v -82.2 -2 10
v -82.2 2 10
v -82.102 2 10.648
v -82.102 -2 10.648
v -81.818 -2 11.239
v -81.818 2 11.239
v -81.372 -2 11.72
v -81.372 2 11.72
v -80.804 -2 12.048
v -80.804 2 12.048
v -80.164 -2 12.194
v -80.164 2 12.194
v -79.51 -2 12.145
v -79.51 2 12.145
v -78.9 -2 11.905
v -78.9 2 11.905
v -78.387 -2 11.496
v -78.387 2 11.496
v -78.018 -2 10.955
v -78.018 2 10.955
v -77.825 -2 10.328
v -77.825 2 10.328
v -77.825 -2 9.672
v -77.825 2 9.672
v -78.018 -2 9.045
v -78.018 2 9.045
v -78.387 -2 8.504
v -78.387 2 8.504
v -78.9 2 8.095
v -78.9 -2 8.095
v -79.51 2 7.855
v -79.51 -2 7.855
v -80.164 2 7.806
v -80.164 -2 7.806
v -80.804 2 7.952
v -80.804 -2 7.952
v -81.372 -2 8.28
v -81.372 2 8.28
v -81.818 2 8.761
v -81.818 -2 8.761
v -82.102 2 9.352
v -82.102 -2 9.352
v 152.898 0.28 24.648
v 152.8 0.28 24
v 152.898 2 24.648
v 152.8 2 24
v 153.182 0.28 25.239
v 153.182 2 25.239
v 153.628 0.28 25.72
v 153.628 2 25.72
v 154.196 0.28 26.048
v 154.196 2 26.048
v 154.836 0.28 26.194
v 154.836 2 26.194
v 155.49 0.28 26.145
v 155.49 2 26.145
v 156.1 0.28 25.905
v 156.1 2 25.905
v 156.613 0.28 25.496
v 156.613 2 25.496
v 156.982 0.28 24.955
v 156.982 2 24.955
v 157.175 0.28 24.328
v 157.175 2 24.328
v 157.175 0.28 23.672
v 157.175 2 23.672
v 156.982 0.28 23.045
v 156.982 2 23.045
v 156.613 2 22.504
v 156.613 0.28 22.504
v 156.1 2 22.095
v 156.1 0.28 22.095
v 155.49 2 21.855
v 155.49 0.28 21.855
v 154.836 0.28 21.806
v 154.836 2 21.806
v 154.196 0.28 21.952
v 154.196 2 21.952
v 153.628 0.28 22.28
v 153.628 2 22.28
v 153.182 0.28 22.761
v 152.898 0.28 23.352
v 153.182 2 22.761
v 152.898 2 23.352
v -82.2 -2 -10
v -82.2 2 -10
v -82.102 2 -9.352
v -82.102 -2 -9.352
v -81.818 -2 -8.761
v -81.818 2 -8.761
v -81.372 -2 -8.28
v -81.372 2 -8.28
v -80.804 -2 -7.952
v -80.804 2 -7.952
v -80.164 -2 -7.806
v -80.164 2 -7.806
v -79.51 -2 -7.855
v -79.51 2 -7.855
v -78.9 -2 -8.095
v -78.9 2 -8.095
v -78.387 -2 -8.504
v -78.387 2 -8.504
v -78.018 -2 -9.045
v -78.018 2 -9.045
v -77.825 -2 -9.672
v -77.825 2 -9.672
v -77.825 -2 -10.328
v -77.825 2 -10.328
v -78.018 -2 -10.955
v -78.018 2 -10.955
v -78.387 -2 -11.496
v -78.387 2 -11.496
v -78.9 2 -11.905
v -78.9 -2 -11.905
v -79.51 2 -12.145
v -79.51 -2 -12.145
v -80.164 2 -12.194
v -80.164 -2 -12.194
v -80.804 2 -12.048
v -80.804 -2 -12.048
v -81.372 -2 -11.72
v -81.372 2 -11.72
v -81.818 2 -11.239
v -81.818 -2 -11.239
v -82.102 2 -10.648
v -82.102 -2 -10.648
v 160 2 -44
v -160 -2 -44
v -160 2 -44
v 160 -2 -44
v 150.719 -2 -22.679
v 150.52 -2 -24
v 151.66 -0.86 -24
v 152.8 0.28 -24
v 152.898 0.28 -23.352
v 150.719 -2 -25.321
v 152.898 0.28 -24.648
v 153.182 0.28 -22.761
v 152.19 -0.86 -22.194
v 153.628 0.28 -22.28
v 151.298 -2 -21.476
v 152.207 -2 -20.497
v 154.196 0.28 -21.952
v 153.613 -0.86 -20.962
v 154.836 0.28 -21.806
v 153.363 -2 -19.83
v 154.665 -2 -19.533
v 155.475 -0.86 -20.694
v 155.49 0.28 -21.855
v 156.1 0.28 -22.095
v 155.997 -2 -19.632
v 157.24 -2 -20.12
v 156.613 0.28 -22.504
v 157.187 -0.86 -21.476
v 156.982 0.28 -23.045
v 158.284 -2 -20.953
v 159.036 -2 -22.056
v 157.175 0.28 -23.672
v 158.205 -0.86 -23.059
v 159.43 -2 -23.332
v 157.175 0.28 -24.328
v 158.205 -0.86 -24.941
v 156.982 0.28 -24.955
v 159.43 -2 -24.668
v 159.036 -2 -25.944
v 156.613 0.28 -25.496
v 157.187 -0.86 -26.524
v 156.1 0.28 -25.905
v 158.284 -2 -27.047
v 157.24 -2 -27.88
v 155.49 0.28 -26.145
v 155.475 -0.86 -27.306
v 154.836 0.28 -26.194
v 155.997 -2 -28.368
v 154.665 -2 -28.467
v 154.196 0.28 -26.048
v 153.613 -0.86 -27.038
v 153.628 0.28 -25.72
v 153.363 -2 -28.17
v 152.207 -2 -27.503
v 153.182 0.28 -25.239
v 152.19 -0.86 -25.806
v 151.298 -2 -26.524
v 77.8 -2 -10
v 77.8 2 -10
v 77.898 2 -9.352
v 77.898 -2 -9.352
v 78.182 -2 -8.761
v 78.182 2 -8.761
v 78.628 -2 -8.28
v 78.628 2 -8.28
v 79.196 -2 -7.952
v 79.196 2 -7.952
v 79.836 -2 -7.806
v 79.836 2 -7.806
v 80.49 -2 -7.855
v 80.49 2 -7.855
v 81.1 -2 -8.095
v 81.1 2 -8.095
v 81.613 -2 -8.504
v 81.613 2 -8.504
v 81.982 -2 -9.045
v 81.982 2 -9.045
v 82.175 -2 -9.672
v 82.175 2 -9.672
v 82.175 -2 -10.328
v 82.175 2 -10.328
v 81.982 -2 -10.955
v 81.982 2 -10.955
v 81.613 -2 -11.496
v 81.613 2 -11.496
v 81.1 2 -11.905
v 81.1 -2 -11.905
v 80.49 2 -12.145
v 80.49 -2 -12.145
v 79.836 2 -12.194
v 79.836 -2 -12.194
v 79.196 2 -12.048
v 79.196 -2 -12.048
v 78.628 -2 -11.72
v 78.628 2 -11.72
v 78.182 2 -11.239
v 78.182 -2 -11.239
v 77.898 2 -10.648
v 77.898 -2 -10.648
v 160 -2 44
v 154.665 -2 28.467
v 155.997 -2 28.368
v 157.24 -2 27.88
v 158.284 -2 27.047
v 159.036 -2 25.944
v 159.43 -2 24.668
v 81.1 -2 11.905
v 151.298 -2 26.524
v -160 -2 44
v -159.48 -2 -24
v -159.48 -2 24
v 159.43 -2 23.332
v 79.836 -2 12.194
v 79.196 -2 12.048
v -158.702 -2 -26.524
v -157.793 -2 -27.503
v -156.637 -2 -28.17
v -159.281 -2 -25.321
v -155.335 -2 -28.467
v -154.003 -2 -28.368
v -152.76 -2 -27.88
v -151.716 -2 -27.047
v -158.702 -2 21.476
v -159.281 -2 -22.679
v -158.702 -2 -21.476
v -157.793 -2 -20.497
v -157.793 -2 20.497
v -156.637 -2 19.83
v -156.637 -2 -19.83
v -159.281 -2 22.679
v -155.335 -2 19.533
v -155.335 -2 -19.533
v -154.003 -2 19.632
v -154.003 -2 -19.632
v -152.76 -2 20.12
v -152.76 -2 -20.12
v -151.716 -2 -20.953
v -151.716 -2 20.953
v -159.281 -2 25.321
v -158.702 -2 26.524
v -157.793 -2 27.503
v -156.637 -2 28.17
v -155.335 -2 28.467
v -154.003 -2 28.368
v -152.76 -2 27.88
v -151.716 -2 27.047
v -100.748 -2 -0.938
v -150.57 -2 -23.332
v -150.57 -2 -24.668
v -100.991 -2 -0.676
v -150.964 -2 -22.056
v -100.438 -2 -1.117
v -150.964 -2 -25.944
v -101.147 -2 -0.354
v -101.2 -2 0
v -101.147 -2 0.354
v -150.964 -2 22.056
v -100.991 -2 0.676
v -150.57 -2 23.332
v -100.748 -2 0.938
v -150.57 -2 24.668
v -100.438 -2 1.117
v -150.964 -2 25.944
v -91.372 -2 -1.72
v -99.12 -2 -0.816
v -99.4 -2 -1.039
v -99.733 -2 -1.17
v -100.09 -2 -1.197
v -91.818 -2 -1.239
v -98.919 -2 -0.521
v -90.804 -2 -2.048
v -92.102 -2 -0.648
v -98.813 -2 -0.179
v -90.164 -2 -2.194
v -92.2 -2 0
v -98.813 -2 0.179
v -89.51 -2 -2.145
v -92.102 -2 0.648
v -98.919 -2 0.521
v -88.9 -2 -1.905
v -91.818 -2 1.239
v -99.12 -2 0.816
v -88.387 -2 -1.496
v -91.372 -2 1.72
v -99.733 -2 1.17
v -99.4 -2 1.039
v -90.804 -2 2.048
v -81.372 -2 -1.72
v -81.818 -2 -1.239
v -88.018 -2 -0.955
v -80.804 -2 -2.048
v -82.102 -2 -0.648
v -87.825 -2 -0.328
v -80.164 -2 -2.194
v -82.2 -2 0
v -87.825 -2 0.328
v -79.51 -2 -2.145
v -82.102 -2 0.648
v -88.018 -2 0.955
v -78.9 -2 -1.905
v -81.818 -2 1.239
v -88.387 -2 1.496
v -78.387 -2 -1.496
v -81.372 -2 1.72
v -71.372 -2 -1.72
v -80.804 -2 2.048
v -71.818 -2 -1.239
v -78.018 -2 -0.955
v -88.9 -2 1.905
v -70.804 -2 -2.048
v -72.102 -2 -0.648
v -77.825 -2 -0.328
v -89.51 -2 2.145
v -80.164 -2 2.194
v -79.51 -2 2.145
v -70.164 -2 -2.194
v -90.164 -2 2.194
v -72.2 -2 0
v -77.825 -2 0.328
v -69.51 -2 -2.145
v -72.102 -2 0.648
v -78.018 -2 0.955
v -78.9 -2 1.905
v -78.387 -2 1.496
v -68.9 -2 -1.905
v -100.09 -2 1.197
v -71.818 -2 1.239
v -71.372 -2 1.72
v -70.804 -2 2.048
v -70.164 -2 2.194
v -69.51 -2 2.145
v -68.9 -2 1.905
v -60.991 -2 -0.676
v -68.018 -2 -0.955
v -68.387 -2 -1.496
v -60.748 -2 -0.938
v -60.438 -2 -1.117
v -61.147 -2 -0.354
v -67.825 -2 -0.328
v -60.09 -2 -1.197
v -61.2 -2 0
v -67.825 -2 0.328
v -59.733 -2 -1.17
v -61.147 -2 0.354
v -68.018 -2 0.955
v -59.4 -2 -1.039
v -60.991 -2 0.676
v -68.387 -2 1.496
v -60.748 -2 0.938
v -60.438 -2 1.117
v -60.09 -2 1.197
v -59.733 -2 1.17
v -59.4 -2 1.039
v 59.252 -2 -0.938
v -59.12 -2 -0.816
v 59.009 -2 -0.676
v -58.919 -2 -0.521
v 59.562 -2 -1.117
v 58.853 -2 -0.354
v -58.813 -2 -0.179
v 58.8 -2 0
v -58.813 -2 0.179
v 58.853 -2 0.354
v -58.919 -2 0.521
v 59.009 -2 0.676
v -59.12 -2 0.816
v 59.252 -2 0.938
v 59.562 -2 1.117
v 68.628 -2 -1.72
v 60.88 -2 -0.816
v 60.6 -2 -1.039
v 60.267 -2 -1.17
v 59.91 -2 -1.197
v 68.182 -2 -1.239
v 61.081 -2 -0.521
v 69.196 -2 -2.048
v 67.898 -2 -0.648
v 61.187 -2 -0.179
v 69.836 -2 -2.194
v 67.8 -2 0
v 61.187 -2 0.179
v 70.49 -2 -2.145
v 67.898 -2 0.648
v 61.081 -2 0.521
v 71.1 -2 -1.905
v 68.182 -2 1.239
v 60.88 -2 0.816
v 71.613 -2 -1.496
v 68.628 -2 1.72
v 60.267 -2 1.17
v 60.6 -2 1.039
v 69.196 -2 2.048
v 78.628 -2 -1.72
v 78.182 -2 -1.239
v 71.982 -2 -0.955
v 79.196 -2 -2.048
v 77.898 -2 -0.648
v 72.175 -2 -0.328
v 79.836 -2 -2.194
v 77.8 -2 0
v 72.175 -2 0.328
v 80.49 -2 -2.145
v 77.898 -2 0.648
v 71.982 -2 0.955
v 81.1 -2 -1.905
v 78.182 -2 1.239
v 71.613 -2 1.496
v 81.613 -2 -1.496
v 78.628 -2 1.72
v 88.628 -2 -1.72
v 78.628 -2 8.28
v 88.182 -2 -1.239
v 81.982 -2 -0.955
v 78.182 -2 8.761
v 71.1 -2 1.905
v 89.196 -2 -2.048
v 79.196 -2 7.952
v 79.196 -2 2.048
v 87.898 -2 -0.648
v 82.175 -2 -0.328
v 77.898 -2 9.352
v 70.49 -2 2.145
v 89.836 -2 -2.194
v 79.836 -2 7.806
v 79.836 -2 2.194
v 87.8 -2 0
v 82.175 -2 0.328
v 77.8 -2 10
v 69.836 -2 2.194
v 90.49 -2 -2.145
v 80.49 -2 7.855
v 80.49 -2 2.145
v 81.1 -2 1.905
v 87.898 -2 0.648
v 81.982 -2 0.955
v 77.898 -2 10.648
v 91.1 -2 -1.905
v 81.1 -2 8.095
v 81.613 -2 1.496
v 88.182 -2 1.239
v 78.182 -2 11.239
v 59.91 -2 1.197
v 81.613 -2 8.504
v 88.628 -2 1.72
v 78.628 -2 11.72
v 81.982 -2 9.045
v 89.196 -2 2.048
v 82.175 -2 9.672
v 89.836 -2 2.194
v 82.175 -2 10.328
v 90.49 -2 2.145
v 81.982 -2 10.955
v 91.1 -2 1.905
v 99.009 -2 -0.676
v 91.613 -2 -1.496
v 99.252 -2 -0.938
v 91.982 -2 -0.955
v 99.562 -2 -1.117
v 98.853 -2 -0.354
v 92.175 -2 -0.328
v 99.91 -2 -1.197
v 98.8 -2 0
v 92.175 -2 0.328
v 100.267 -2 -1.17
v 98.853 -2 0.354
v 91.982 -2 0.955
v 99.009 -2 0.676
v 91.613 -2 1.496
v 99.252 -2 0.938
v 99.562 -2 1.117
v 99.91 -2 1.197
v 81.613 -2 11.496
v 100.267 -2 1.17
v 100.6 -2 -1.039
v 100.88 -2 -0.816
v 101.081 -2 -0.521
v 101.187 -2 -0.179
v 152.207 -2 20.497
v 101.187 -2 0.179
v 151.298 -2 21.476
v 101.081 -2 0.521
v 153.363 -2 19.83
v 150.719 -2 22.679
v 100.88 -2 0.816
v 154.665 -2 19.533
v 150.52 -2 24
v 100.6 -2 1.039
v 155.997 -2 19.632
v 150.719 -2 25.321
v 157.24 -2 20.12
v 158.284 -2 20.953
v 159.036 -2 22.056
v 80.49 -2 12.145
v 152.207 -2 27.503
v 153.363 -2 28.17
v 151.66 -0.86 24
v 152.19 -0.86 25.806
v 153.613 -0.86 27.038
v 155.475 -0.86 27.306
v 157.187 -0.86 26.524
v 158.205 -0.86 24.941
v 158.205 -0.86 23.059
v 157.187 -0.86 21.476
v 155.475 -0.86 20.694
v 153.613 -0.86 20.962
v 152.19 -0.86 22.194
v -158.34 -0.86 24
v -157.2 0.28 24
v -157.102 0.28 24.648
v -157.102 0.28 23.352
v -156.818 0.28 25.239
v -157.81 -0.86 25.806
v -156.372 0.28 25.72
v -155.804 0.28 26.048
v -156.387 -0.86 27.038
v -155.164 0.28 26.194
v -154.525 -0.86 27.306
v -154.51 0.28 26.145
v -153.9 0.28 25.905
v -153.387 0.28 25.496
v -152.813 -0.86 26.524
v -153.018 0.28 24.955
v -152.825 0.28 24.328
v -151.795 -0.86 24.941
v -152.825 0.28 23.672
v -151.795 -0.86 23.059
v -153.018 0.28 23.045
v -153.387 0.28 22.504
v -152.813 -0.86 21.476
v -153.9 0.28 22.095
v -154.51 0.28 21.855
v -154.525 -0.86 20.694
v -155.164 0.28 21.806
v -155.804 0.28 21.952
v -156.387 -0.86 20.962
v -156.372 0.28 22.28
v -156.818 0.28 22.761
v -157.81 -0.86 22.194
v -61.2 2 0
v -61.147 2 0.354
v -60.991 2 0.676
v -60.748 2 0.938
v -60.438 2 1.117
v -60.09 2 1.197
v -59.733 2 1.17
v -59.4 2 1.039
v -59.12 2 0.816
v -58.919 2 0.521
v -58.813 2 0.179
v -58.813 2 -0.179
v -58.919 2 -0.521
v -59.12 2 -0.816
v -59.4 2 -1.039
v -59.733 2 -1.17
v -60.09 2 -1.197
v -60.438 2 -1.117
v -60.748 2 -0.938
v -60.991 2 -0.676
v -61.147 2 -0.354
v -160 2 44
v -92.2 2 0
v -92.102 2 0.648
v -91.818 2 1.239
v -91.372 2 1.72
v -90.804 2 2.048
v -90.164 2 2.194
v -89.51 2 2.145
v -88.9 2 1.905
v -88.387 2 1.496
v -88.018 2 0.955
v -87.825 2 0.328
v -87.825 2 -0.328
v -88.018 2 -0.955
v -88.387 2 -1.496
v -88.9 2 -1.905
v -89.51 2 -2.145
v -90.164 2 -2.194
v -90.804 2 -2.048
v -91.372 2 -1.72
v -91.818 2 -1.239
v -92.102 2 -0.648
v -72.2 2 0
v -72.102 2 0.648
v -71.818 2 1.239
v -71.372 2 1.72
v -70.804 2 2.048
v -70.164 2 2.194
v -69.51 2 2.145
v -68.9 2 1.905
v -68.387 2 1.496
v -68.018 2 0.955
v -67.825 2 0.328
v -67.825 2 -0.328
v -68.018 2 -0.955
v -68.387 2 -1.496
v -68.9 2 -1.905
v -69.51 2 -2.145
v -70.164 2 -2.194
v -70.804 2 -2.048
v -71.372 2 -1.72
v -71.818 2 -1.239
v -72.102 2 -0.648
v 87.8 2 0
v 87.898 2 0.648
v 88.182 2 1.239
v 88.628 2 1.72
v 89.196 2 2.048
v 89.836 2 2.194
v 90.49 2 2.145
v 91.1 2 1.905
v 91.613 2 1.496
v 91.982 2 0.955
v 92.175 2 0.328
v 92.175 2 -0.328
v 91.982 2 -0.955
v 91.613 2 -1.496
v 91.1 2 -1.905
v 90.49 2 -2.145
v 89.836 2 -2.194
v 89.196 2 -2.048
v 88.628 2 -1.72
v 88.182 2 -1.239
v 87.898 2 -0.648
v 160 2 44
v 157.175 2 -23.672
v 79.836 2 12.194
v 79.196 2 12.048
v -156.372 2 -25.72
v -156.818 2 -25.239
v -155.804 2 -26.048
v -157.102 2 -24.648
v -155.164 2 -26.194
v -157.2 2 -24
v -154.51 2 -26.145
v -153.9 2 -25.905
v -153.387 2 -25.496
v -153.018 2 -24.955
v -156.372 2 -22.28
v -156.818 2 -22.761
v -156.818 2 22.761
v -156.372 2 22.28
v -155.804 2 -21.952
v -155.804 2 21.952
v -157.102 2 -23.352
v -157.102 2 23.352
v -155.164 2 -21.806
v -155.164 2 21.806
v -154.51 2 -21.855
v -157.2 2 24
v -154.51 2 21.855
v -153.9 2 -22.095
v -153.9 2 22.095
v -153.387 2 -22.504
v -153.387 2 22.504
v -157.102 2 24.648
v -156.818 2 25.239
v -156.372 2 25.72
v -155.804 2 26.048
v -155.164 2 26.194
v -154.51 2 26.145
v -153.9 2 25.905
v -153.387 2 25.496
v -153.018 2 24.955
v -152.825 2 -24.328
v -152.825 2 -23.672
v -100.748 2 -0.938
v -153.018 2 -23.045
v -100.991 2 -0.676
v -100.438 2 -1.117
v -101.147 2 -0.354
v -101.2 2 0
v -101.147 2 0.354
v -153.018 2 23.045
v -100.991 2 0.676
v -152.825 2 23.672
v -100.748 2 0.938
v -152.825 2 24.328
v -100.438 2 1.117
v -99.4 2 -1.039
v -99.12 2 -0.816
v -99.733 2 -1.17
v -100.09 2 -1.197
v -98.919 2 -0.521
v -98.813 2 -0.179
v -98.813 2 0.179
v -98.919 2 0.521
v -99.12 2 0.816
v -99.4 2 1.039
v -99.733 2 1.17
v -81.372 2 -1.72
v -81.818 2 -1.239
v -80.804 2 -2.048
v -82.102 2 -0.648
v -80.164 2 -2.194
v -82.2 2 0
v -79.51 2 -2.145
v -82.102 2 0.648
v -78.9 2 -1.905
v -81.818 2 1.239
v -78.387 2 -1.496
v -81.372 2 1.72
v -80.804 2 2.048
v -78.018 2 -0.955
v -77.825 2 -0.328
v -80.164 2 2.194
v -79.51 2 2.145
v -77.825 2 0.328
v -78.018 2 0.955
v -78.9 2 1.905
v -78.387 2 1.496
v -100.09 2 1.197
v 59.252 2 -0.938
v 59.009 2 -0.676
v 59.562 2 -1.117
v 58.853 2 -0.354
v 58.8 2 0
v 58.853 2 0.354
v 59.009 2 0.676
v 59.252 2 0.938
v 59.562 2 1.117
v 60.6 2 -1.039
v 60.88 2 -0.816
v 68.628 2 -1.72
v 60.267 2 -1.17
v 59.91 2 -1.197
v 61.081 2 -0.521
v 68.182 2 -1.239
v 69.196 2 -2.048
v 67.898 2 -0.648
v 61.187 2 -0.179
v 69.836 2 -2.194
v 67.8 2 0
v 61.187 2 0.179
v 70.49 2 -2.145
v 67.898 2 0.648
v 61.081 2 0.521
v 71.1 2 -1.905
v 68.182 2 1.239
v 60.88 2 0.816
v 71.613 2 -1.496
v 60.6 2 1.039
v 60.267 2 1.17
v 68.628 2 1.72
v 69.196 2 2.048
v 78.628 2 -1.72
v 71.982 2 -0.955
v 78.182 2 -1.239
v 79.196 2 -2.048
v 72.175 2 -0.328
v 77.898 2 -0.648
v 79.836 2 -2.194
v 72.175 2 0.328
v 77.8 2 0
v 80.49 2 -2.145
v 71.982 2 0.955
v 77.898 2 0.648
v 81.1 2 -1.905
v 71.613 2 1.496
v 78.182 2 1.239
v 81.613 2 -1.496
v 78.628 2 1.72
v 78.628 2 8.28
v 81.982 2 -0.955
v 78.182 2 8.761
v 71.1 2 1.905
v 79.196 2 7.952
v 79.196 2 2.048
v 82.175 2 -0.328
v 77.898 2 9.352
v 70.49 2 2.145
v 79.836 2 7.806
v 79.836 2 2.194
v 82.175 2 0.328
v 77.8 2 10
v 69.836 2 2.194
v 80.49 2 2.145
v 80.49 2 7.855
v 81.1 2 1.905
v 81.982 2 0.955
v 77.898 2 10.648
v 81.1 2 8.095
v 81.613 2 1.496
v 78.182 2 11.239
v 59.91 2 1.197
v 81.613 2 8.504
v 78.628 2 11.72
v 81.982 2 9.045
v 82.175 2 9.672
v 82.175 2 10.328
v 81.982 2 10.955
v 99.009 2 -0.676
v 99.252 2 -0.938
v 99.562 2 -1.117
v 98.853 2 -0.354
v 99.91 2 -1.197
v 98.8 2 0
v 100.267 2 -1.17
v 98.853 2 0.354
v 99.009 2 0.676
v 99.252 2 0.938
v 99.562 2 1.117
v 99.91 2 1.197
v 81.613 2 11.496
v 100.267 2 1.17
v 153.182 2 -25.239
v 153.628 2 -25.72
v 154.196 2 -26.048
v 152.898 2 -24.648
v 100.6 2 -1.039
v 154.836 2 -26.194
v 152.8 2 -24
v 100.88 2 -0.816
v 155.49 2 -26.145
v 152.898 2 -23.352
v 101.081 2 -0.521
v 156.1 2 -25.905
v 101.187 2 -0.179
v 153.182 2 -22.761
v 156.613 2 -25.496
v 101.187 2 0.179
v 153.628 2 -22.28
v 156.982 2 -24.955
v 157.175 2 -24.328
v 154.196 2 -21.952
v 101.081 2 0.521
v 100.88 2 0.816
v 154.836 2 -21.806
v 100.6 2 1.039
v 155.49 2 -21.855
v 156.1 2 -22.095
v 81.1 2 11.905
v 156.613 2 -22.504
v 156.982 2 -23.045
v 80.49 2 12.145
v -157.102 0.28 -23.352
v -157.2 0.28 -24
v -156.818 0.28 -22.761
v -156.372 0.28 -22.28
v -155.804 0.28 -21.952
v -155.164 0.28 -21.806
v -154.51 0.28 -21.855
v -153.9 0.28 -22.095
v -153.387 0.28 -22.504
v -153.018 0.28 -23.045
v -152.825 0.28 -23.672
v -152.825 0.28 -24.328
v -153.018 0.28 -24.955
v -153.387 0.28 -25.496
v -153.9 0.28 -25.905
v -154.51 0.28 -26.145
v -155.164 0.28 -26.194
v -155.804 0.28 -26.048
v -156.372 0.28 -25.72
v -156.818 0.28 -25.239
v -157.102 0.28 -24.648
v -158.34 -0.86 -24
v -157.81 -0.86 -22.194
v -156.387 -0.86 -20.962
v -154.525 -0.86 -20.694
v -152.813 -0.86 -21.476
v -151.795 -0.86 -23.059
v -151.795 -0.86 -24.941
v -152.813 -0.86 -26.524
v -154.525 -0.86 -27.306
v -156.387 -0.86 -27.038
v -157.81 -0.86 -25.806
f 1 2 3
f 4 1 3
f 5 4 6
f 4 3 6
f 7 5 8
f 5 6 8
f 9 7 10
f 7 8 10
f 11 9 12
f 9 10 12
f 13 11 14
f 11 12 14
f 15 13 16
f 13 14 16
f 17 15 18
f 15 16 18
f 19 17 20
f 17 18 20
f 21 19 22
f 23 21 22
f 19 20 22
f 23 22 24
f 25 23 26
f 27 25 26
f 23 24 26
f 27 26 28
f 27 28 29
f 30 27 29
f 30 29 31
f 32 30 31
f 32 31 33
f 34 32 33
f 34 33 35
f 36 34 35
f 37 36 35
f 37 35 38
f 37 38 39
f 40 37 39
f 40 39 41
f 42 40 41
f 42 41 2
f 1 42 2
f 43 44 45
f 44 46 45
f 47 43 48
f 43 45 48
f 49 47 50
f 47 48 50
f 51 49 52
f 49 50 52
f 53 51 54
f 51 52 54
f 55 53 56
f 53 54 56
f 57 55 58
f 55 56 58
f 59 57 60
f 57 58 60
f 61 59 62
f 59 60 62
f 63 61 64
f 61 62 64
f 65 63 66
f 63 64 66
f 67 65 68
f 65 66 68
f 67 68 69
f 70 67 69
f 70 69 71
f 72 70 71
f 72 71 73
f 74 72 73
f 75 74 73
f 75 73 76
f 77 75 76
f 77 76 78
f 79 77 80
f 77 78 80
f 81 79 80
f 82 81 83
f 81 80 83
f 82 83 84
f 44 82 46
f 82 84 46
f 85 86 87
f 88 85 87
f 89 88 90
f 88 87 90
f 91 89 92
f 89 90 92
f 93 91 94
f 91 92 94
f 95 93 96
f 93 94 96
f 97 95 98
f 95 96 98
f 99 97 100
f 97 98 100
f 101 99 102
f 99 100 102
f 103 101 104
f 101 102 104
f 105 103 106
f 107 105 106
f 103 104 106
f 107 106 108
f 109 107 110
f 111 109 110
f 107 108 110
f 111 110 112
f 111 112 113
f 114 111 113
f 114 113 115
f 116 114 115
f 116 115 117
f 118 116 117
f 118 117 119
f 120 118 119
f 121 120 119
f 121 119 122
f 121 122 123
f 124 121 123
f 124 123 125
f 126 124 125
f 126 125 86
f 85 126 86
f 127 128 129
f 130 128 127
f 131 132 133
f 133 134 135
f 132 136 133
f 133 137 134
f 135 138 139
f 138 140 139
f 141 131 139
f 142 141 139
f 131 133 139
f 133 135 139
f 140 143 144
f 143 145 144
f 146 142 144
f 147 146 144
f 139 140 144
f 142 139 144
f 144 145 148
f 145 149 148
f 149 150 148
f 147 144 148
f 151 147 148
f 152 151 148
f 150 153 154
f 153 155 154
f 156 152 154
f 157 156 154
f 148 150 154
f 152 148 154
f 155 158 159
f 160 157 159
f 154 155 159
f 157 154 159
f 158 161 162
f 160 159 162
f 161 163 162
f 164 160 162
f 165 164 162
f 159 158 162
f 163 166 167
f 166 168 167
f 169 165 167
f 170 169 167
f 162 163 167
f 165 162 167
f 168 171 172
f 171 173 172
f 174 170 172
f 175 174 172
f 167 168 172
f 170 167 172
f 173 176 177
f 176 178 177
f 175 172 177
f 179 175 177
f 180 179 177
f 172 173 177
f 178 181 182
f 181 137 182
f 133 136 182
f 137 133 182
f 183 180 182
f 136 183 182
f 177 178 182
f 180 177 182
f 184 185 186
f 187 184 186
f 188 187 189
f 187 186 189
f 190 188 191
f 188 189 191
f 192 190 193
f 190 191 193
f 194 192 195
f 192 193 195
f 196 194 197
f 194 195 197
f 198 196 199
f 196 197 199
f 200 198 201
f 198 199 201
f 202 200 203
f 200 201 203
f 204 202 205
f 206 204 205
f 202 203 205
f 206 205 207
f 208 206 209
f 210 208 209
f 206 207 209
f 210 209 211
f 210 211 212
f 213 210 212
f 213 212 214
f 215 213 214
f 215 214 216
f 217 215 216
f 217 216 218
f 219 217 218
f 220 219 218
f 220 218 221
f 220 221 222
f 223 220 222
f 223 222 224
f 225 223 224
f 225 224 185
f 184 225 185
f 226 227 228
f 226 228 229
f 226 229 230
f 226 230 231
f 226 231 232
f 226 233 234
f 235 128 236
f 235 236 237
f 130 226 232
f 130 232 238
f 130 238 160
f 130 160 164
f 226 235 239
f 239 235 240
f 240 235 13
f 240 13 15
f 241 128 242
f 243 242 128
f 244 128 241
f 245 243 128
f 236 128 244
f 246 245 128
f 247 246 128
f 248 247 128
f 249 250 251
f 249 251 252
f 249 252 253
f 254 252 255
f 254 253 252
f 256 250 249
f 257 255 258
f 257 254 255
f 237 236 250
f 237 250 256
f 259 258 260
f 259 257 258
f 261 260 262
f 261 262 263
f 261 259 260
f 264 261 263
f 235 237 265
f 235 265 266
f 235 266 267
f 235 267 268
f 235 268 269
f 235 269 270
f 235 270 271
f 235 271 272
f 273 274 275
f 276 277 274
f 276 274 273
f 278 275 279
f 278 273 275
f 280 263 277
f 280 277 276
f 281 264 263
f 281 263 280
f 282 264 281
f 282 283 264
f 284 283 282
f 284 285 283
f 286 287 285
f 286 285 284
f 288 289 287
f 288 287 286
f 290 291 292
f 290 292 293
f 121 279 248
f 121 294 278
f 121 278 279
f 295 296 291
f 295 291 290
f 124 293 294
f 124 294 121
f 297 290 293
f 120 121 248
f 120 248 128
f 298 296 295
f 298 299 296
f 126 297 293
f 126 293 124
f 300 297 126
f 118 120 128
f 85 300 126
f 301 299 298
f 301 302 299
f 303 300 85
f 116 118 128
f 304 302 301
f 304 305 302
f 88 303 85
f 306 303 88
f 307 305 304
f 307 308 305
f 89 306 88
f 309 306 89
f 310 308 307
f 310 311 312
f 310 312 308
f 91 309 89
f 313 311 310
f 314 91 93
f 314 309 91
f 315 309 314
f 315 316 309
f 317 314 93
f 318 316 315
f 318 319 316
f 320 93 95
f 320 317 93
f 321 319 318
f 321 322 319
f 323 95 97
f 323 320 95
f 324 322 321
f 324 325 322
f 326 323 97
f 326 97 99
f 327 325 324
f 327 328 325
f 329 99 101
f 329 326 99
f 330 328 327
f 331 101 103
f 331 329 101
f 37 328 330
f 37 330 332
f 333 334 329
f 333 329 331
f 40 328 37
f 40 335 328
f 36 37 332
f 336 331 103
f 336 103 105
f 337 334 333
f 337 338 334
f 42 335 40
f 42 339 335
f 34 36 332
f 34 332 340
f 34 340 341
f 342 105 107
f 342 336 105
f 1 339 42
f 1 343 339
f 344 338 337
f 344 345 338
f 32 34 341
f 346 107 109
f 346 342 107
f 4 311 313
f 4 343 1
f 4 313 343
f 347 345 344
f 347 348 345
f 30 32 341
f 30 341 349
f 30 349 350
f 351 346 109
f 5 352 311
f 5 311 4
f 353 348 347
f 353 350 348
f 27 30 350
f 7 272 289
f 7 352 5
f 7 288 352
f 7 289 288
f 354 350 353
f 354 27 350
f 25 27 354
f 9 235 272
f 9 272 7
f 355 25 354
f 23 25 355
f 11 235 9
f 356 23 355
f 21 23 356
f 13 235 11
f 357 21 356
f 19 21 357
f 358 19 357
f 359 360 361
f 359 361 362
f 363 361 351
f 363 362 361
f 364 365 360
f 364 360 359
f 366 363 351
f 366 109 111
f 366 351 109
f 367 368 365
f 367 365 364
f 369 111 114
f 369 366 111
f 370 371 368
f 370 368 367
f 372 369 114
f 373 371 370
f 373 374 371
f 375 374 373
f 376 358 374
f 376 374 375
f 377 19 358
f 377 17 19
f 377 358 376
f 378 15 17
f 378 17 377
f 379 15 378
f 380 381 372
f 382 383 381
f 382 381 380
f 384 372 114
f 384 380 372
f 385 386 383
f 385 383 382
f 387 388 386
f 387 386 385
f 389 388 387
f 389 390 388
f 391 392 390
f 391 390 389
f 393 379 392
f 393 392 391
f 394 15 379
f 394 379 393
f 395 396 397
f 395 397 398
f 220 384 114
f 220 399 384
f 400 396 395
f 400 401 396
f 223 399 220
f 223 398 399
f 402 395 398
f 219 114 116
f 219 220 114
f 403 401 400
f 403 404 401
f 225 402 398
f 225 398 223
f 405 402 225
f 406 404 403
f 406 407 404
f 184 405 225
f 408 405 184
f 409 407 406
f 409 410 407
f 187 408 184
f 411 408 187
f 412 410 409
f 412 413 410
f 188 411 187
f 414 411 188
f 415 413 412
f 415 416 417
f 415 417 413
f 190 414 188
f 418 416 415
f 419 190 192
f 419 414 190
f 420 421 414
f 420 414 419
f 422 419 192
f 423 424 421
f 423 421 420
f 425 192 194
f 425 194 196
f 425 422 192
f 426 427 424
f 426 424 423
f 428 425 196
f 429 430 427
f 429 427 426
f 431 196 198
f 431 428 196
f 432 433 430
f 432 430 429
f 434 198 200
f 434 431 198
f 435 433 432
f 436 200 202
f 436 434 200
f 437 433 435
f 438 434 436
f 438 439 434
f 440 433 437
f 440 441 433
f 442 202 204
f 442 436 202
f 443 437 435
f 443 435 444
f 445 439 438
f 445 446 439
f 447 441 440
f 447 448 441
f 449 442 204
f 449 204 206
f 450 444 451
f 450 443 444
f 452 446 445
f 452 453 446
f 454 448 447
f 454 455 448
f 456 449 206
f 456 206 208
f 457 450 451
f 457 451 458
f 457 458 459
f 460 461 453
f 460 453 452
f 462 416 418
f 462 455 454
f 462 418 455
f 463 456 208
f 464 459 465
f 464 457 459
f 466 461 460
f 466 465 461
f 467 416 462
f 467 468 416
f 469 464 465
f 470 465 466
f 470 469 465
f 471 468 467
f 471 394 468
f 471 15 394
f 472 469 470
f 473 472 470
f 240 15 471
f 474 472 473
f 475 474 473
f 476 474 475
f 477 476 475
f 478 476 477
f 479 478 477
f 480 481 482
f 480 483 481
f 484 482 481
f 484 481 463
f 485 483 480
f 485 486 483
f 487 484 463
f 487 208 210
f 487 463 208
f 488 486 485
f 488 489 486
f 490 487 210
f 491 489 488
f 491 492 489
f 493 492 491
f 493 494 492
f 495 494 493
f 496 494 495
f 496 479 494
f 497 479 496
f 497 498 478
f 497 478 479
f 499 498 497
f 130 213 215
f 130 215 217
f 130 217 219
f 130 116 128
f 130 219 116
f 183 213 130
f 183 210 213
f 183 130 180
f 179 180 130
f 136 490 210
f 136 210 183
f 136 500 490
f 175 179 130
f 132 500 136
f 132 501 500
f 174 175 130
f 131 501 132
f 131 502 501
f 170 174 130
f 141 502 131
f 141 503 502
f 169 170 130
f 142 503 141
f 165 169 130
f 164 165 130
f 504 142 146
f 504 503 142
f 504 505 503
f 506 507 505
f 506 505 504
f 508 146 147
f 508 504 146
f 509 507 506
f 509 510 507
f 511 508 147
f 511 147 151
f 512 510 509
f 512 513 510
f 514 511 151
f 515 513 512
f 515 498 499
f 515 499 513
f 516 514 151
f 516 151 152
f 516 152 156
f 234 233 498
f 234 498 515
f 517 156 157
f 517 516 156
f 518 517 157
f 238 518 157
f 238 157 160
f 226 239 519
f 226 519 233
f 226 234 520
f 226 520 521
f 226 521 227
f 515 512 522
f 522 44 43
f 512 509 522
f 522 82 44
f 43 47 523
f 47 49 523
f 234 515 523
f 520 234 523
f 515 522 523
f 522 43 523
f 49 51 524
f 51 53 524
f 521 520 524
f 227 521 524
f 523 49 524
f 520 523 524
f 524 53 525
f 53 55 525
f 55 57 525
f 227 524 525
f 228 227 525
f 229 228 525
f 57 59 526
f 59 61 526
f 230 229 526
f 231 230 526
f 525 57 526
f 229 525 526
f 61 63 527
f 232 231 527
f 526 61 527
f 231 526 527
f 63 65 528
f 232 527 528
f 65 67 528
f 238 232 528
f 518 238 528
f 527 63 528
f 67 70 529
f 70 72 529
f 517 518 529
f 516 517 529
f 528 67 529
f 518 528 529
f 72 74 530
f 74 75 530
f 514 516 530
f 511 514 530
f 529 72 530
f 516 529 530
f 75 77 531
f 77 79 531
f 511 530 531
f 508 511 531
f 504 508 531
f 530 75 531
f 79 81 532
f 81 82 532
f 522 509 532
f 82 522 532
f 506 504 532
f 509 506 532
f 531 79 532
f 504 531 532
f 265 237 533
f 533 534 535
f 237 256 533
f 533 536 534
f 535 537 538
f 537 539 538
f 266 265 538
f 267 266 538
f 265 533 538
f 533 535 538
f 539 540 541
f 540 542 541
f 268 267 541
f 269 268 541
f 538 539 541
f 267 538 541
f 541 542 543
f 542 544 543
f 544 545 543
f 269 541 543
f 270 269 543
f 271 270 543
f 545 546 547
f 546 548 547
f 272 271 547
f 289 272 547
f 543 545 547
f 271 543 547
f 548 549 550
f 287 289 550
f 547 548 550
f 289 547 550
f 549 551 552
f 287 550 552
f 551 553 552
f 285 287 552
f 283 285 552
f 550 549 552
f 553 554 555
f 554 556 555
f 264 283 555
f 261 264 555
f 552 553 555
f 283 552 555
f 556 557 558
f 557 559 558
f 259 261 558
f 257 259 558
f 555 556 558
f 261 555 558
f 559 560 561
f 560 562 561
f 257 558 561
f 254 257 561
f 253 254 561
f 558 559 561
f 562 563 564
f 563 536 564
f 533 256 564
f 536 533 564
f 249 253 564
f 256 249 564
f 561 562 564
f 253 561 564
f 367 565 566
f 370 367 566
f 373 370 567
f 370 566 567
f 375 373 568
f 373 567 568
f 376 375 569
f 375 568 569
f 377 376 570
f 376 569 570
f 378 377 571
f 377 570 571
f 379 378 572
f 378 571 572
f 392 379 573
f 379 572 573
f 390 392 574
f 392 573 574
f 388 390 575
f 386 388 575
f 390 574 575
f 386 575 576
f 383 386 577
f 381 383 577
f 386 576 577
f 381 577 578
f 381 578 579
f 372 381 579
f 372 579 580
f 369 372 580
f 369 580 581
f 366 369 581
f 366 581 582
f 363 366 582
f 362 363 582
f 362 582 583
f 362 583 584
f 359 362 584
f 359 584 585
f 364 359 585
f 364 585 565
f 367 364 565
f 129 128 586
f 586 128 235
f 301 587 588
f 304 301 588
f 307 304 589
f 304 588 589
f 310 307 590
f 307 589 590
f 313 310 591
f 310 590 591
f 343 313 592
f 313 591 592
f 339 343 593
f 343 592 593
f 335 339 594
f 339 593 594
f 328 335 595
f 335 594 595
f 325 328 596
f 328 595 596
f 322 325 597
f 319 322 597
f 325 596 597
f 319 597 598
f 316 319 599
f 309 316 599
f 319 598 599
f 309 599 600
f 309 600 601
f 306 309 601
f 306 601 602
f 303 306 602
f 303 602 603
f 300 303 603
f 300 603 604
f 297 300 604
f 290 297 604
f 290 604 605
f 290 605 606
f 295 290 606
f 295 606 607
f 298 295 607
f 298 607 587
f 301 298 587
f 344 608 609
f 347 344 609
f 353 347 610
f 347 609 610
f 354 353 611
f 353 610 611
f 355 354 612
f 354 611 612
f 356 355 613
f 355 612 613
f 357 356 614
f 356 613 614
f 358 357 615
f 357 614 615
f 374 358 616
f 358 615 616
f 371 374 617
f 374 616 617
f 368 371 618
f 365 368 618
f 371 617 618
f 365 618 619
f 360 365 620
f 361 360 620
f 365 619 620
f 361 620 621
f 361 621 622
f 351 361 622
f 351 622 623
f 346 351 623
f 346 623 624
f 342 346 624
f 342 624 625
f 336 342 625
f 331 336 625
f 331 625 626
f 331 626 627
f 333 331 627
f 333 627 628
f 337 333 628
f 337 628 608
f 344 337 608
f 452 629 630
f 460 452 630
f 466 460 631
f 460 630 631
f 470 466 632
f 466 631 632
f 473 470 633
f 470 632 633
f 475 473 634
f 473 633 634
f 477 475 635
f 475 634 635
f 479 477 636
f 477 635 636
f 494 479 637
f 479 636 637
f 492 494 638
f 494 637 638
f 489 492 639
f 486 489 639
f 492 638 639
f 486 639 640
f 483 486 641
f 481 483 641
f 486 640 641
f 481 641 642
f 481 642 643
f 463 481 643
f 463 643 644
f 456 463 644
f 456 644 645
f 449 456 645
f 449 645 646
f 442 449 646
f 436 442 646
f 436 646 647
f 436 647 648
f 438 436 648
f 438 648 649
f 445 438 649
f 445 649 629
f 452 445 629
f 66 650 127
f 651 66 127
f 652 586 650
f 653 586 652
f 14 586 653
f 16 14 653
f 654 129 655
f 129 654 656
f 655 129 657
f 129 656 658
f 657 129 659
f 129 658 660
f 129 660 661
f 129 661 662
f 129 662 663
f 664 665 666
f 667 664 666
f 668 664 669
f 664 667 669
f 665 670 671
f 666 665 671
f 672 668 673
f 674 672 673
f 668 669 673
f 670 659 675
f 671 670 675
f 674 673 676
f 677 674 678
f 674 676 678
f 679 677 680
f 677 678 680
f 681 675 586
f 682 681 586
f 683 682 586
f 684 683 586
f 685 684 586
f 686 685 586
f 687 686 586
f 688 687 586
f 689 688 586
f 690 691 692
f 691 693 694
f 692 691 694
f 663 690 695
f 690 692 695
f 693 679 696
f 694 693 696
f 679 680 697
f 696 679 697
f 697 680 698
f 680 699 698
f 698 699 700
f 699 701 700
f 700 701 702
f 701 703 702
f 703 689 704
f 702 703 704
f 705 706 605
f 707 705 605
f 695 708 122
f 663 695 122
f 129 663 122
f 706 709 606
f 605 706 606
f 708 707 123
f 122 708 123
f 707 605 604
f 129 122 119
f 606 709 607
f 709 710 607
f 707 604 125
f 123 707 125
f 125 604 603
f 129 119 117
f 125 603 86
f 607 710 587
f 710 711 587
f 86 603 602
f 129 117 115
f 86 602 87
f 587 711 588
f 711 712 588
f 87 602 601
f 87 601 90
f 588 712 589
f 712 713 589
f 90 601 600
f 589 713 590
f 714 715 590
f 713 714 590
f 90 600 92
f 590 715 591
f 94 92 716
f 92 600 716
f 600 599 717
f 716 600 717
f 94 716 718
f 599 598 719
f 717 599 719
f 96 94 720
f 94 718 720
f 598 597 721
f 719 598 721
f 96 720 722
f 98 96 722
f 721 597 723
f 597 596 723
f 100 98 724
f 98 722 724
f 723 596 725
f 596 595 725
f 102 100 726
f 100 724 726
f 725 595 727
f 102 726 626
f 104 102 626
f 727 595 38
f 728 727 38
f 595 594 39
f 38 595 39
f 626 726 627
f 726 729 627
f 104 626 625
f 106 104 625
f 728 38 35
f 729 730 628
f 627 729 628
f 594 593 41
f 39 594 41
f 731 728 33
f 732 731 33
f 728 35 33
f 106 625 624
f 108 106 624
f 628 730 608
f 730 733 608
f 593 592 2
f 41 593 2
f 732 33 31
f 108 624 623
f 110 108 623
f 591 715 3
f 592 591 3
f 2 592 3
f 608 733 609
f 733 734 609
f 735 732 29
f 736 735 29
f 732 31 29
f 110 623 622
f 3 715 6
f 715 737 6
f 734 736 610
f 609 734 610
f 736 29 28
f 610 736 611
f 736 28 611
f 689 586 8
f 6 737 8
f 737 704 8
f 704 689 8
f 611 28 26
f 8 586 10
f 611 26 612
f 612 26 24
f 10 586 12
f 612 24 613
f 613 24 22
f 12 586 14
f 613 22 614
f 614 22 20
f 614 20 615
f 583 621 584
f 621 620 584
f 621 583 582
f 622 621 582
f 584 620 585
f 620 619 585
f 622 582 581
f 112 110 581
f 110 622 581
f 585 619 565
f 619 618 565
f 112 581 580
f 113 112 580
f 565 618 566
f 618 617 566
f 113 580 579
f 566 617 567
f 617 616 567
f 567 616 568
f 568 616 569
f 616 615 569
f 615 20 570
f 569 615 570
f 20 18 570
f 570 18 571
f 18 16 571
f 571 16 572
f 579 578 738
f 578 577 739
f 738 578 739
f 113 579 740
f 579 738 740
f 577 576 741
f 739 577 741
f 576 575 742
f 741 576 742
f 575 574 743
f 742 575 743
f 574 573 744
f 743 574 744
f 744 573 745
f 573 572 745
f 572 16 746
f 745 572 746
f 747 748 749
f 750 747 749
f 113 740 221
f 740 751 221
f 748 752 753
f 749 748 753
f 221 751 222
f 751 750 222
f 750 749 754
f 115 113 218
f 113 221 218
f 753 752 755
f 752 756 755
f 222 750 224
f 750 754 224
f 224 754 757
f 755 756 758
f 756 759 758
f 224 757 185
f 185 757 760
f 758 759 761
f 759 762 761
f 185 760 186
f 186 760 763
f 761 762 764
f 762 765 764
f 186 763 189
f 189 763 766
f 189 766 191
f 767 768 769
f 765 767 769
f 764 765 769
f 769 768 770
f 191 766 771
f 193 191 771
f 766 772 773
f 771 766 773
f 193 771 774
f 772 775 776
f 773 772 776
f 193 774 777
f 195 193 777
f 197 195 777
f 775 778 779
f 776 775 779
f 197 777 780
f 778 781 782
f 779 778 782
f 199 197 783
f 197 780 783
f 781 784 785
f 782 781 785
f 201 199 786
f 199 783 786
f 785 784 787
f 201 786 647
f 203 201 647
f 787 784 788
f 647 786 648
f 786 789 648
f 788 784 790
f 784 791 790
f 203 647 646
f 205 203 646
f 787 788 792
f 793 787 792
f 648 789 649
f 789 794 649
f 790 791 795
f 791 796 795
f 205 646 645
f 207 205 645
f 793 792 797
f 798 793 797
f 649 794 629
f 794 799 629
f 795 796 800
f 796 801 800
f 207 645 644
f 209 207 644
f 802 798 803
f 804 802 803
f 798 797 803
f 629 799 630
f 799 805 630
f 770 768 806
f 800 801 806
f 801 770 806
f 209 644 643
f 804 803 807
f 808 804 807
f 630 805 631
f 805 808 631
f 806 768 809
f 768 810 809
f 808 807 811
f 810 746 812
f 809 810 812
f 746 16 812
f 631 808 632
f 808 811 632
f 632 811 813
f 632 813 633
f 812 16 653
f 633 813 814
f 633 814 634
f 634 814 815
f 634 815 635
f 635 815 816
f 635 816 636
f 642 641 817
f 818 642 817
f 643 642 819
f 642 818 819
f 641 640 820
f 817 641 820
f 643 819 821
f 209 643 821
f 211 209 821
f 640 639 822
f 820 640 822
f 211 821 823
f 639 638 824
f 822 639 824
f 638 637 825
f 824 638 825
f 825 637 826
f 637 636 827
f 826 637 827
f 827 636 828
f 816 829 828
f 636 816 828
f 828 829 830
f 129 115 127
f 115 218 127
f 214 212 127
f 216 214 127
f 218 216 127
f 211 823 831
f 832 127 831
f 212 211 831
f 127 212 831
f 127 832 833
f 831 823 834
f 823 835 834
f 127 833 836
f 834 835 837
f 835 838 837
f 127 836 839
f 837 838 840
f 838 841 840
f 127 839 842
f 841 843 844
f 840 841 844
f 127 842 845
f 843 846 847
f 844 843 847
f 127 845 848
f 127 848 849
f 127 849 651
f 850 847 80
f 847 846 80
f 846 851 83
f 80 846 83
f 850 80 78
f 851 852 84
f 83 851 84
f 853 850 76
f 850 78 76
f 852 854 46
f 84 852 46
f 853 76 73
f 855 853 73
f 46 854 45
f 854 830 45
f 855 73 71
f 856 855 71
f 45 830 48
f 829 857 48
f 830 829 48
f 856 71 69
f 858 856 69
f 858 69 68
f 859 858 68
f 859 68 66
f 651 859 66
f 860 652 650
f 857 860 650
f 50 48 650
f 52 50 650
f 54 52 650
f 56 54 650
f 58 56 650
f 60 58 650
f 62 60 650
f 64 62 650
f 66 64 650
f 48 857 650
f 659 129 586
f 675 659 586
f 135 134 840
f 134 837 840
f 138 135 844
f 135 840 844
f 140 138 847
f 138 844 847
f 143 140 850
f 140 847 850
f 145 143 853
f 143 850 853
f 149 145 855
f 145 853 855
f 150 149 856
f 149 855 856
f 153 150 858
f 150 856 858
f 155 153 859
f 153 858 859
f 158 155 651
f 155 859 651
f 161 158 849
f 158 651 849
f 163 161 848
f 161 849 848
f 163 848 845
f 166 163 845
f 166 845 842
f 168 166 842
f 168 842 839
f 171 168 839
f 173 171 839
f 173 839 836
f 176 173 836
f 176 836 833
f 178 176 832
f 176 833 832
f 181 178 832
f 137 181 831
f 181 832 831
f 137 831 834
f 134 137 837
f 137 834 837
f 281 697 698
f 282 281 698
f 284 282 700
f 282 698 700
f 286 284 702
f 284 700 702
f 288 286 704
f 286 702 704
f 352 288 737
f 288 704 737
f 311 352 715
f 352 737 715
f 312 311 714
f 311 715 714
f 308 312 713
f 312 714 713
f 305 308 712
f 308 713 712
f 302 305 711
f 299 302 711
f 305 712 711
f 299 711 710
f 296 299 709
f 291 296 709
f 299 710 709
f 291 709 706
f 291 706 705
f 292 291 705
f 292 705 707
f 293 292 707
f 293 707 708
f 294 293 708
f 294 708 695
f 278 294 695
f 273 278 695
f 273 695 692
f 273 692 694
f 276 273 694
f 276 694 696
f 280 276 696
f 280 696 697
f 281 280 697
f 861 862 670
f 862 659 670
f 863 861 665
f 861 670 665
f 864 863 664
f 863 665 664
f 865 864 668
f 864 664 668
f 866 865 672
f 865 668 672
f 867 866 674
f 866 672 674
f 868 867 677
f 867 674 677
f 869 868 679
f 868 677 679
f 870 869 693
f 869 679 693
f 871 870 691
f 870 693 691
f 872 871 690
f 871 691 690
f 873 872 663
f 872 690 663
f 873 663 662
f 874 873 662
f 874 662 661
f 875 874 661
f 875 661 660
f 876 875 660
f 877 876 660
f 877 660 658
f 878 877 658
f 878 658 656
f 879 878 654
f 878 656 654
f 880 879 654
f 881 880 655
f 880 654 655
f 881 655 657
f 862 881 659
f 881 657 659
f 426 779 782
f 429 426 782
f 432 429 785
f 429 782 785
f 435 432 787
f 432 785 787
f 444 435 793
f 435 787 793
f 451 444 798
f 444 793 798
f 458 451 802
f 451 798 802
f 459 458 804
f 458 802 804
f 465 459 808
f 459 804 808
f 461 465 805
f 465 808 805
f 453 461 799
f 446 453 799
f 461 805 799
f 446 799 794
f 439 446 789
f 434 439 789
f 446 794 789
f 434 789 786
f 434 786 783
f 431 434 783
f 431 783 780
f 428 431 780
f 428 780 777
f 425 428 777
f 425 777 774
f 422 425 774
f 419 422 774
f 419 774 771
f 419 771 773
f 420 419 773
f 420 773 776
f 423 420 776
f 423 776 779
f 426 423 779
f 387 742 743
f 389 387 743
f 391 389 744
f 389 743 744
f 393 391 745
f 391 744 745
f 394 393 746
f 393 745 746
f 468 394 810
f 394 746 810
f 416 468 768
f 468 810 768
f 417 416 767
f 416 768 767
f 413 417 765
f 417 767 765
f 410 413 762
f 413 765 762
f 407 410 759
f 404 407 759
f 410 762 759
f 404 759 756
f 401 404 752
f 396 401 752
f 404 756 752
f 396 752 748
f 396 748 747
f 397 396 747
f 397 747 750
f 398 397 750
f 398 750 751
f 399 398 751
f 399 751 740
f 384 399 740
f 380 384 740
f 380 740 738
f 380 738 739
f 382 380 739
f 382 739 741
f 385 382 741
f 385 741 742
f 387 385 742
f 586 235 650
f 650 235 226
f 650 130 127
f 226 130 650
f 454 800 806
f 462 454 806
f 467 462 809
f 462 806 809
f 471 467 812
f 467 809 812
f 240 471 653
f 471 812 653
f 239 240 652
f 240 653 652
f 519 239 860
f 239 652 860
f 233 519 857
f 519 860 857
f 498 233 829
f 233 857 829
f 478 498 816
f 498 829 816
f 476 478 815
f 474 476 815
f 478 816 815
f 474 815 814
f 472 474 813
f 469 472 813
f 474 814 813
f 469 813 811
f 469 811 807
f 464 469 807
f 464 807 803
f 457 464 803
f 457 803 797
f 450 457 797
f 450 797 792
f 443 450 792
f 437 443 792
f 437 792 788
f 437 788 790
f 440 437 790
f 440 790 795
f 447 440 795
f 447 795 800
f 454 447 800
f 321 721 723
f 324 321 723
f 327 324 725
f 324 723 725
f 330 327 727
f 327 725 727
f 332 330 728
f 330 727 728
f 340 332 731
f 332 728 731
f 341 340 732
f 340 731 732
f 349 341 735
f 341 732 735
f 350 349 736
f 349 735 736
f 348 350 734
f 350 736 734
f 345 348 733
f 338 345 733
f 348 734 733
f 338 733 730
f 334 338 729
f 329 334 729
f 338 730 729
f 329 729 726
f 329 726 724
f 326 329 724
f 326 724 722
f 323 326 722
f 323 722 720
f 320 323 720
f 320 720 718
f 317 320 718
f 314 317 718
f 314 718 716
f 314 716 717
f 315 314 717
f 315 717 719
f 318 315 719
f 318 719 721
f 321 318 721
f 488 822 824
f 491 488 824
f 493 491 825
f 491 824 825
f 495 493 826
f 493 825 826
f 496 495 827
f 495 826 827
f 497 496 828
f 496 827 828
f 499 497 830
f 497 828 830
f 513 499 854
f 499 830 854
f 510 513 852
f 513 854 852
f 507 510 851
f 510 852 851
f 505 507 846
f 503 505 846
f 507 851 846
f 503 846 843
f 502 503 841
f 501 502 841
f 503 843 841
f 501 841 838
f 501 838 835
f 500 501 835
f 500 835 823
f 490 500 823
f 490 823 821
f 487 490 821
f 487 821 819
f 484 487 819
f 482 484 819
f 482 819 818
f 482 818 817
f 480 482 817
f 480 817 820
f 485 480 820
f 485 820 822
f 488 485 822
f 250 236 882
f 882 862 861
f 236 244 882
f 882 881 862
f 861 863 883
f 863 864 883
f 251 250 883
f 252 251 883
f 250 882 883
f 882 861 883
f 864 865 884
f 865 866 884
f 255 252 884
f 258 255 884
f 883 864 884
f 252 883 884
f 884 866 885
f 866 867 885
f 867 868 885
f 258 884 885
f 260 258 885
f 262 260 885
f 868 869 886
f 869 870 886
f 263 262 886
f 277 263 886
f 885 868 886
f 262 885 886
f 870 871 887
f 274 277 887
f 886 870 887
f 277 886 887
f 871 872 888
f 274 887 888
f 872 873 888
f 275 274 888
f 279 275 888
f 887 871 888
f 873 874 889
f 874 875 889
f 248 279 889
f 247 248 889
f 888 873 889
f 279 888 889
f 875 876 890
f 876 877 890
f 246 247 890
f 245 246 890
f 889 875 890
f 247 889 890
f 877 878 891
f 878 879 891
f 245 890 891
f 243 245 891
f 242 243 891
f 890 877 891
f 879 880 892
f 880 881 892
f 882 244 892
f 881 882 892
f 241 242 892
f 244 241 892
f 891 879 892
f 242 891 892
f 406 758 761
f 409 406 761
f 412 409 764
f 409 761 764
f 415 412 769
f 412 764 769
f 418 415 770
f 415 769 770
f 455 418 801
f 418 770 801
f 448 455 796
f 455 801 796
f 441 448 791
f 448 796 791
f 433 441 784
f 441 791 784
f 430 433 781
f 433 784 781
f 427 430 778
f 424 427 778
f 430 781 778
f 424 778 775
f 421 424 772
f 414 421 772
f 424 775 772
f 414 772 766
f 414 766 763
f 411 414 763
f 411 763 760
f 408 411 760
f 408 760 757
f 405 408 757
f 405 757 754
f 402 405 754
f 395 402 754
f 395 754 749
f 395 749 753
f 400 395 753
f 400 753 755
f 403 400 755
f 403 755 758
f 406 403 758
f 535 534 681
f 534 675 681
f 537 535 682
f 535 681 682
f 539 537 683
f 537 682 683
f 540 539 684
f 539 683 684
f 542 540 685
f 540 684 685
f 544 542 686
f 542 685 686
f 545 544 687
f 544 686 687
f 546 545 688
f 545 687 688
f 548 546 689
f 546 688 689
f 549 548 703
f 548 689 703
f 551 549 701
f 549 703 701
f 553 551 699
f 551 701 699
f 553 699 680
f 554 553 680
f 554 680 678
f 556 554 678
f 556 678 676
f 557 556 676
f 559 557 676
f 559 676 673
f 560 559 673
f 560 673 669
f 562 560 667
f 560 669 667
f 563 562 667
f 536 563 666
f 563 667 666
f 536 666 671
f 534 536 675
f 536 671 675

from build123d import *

# Parameters (mm, degrees)
F0_W           = 320
F0_H           = 88
F1_DEPTH       = 2
F3_D           = 4.4
F3_DEPTH       = 17.25
F3_CSINK_D     = 8.96
F3_CSINK_ANGLE = 90
F3_TIP         = 1.3218933619
F5_D           = 2.4
F6_D           = 4.4


with BuildPart() as f1:
    # F0 (on Front) → F1 (new body, symmetric)
    with BuildSketch(Plane.XZ):
        Rectangle(F0_W, F0_H)
    extrude(amount=F1_DEPTH, both=True)

    # F3
    with Locations(Plane.XZ.offset(2)):
        with Locations((155, 24), (155, -24), (-155, -24), (-155, 24)):
            CounterSinkHole(F3_D / 2, F3_CSINK_D / 2, depth=F3_DEPTH, counter_sink_angle=F3_CSINK_ANGLE)
            with Locations((0, 0, -(F3_DEPTH + F3_TIP / 2))):  # 118° drill point
                Cone(0, F3_D / 2, F3_TIP, mode=Mode.SUBTRACT)

    # F5 (through all)
    with Locations(Plane.XZ.offset(2)):
        with Locations((-100, 0), (-60, 0), (60, 0), (100, 0)):
            Hole(F5_D / 2)

    # F6 (through all)
    with Locations(Plane.XZ.offset(2)):
        with Locations((-90, 0), (-80, 10), (-80, 0), (-80, -10), (-70, 0), (70, 0), (80, 0), (90, 0), (80, 10), (80, -10)):
            Hole(F6_D / 2)


solid = f1.part
